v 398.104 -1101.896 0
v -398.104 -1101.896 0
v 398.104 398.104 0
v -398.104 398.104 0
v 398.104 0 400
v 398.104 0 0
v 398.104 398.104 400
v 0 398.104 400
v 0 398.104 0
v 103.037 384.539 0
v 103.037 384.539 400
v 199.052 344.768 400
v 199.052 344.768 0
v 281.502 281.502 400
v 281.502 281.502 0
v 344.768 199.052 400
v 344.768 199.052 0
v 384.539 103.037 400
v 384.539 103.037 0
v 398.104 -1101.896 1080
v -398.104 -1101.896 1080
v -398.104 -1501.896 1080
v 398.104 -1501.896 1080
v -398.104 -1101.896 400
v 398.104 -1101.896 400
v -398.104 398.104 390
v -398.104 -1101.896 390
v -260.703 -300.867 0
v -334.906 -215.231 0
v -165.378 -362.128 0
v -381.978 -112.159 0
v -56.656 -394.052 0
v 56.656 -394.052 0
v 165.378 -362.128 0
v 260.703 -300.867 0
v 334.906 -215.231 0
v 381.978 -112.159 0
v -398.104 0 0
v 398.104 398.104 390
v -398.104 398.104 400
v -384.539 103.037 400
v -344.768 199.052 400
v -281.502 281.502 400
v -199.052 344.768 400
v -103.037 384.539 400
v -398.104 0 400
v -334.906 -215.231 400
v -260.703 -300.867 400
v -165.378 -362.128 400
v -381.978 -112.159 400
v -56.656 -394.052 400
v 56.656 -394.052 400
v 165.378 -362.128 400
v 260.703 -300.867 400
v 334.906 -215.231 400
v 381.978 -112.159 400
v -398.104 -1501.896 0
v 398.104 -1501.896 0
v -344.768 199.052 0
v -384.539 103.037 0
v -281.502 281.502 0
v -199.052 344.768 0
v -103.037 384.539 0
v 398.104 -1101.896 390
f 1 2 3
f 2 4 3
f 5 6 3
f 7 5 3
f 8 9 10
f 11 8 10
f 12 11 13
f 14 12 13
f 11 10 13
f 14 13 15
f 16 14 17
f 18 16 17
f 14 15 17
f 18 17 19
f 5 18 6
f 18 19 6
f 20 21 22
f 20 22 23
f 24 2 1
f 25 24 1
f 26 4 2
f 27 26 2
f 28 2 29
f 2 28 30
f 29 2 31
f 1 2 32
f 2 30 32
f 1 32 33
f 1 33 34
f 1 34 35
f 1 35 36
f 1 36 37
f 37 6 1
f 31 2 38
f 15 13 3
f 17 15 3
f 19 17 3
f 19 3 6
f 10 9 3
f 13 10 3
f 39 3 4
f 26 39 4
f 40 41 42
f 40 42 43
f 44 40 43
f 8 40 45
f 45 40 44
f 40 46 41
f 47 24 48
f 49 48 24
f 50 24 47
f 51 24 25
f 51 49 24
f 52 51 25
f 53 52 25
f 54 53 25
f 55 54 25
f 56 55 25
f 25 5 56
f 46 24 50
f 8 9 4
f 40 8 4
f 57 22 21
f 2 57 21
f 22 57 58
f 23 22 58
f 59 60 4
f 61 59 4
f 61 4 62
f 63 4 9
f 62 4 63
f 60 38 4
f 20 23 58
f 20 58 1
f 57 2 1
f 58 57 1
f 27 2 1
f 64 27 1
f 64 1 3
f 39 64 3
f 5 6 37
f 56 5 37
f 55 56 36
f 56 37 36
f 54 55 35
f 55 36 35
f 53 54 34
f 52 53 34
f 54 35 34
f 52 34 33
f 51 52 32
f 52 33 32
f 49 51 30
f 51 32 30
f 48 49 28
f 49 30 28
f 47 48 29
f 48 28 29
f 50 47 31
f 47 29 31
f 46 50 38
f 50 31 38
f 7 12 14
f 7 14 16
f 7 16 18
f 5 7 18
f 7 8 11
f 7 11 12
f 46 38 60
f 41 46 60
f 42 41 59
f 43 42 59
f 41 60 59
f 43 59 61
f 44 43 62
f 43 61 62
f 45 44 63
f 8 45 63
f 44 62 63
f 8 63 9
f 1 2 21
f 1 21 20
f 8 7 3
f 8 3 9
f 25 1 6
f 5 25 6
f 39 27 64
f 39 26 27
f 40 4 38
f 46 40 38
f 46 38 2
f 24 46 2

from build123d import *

# Parameters (mm, degrees)
F1_DEPTH = 400
F2_DEPTH = 390
F3_W     = 796.20788
F3_H     = 400
F4_DEPTH = 1080


with BuildPart() as f1:
    # F0 (on Top) → F1 (new body)
    with BuildSketch(Plane.XY):
        with BuildLine():
            Line((398.10394, -1101.89606), (398.10394, 0))
            ThreePointArc((398.10394, 0), (7.974e-07, -398.10394), (-398.10394, -1.5948e-06))
            Line((-398.10394, -1.5948e-06), (-398.10394, -1101.89606))
            Line((-398.10394, -1101.89606), (398.10394, -1101.89606))
        make_face()
    extrude(amount=F1_DEPTH)


with BuildPart() as f1b:
    # F0 (on Top) → F1, piece 2 (new body)
    with BuildSketch(Plane.XY):
        with BuildLine():
            ThreePointArc((-4.806e-07, 398.10394), (281.5019954212, 281.501995761), (398.10394, 0))
            Line((398.10394, 0), (398.10394, 398.10394))
            Line((398.10394, 398.10394), (-4.806e-07, 398.10394))
        make_face()
    extrude(amount=F1_DEPTH)


with BuildPart() as f1c:
    # F0 (on Top) → F1, piece 3 (new body)
    with BuildSketch(Plane.XY):
        with BuildLine():
            ThreePointArc((-398.10394, -1.5948e-06), (-281.5019963248, 281.5019948573), (-4.806e-07, 398.10394))
            Line((-4.806e-07, 398.10394), (-398.10394, 398.10394))
            Line((-398.10394, 398.10394), (-398.10394, -1.5948e-06))
        make_face()
    extrude(amount=F1_DEPTH)


with BuildPart() as f2:
    # F0 (on Top) → F2 (new body)
    with BuildSketch(Plane.XY):
        with BuildLine():
            ThreePointArc((-398.10394, -1.5948e-06), (7.974e-07, -398.10394), (398.10394, 0))
            ThreePointArc((398.10394, 0), (281.5019954212, 281.501995761), (-4.806e-07, 398.10394))
            ThreePointArc((-4.806e-07, 398.10394), (-281.5019963248, 281.5019948573), (-398.10394, -1.5948e-06))
        make_face()
        with BuildLine():
            Line((398.10394, -1101.89606), (398.10394, 0))
            ThreePointArc((398.10394, 0), (7.974e-07, -398.10394), (-398.10394, -1.5948e-06))
            Line((-398.10394, -1.5948e-06), (-398.10394, -1101.89606))
            Line((-398.10394, -1101.89606), (398.10394, -1101.89606))
        make_face()
        with BuildLine():
            ThreePointArc((-4.806e-07, 398.10394), (281.5019954212, 281.501995761), (398.10394, 0))
            Line((398.10394, 0), (398.10394, 398.10394))
            Line((398.10394, 398.10394), (-4.806e-07, 398.10394))
        make_face()
        with BuildLine():
            ThreePointArc((-398.10394, -1.5948e-06), (-281.5019963248, 281.5019948573), (-4.806e-07, 398.10394))
            Line((-4.806e-07, 398.10394), (-398.10394, 398.10394))
            Line((-398.10394, 398.10394), (-398.10394, -1.5948e-06))
        make_face()
    extrude(amount=F2_DEPTH)


with BuildPart() as f4:
    # F3 (on Top) → F4 (new body)
    with BuildSketch(Plane.XY):
        with Locations((0, -1301.89606)):
            Rectangle(F3_W, F3_H)
    extrude(amount=F4_DEPTH)


solid = Compound([f1.part, f1b.part, f1c.part, f2.part, f4.part])
